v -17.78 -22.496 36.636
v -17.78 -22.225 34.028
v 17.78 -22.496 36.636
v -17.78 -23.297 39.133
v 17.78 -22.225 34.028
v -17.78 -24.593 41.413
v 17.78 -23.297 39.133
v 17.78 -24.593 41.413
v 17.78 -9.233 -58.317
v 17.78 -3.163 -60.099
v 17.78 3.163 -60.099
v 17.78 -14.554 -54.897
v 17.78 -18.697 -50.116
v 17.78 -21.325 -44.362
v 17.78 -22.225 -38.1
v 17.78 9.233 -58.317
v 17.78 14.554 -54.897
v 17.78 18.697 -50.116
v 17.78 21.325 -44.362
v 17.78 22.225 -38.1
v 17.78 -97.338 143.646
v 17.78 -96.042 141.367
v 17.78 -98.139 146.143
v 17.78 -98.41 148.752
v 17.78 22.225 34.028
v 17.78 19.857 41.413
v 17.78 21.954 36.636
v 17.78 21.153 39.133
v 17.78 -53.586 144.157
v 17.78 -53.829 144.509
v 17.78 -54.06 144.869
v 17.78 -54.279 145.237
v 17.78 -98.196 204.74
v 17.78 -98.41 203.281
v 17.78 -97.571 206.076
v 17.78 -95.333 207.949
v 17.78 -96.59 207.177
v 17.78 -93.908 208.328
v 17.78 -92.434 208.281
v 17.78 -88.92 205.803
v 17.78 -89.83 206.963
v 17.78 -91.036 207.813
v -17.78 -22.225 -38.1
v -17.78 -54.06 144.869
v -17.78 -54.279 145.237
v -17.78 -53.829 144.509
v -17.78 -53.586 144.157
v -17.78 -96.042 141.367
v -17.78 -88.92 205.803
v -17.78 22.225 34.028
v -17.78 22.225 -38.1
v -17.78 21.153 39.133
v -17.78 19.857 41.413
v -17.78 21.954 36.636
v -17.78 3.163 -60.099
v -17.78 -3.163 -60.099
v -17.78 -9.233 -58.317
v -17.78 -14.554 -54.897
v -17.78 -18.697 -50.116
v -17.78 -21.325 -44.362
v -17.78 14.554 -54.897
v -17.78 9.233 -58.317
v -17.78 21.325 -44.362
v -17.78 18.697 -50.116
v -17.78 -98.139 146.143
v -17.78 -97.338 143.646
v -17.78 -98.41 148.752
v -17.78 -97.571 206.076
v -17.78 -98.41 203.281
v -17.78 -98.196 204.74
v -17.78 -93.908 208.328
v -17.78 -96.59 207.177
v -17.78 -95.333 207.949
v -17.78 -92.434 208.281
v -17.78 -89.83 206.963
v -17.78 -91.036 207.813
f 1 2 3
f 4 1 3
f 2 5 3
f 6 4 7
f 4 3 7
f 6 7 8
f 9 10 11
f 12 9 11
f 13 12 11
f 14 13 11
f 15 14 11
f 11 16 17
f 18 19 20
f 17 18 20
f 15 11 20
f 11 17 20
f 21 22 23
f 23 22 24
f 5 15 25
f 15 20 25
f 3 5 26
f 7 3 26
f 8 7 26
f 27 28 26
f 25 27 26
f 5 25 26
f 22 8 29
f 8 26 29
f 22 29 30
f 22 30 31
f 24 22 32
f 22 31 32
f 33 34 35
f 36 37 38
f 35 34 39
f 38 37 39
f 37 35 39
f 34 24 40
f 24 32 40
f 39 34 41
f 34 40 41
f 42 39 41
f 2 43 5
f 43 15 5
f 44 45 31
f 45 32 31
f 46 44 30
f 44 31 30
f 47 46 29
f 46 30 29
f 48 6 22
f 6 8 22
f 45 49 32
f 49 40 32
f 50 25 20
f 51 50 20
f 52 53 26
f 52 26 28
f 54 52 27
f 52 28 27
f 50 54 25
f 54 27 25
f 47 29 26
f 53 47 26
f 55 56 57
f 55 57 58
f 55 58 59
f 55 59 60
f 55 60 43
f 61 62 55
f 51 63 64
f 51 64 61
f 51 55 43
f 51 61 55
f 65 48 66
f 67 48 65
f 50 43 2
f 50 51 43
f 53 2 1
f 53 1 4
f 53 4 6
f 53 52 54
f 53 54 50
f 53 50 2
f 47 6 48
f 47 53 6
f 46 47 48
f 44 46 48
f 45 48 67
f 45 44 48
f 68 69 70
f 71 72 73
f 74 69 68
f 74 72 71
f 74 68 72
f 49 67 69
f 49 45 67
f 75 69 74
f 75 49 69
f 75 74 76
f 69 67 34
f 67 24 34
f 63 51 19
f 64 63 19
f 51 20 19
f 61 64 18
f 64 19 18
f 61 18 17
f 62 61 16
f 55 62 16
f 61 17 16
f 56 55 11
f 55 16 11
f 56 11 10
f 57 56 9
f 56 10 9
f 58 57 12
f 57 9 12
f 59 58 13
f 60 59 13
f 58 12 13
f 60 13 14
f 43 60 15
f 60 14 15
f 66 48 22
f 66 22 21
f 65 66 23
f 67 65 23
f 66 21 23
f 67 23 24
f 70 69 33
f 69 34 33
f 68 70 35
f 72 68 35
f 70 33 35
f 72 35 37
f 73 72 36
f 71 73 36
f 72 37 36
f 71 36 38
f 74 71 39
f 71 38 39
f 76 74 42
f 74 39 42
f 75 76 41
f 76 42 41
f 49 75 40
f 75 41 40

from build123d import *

# Parameters (mm, degrees)
BOSS_EXTRUDE1_DEPTH = 17.78


with BuildPart() as part:
    # Sketch1 → Boss-Extrude1 (new body, symmetric)
    with BuildSketch(Plane(origin=(0, 0, 0), x_dir=(0, 0, -1), z_dir=(1, 0, 0))):
        with BuildLine():
            Line((-34.027638145, 22.225), (38.1, 22.225))
            ThreePointArc((38.1, 22.225), (60.325, 0), (38.1, -22.225))
            Line((38.1, -22.225), (-34.027638145, -22.225))
            ThreePointArc((-34.027638145, -22.225), (-37.905512075, -22.831526811), (-41.41298687, -24.593174207))
            Line((-41.41298687, -24.593174207), (-141.36658517, -96.041550766))
            ThreePointArc((-141.36658517, -96.041550766), (-144.874059965, -97.803198163), (-148.751933895, -98.409724974))
            Line((-148.751933895, -98.409724974), (-203.2806723, -98.409724974))
            ThreePointArc((-203.2806723, -98.409724974), (-208.190227055, -94.634589756), (-205.802839661, -88.920068321))
            Line((-205.802839661, -88.920068321), (-145.237041742, -54.278577891))
            ThreePointArc((-145.237041742, -54.278577891), (-144.688329899, -53.946063756), (-144.157111422, -53.586262051))
            Line((-144.157111422, -53.586262051), (-41.41298687, 19.856825793))
            ThreePointArc((-41.41298687, 19.856825793), (-37.905512075, 21.618473189), (-34.027638145, 22.225))
        make_face()
    extrude(amount=BOSS_EXTRUDE1_DEPTH, both=True)


solid = part.part
